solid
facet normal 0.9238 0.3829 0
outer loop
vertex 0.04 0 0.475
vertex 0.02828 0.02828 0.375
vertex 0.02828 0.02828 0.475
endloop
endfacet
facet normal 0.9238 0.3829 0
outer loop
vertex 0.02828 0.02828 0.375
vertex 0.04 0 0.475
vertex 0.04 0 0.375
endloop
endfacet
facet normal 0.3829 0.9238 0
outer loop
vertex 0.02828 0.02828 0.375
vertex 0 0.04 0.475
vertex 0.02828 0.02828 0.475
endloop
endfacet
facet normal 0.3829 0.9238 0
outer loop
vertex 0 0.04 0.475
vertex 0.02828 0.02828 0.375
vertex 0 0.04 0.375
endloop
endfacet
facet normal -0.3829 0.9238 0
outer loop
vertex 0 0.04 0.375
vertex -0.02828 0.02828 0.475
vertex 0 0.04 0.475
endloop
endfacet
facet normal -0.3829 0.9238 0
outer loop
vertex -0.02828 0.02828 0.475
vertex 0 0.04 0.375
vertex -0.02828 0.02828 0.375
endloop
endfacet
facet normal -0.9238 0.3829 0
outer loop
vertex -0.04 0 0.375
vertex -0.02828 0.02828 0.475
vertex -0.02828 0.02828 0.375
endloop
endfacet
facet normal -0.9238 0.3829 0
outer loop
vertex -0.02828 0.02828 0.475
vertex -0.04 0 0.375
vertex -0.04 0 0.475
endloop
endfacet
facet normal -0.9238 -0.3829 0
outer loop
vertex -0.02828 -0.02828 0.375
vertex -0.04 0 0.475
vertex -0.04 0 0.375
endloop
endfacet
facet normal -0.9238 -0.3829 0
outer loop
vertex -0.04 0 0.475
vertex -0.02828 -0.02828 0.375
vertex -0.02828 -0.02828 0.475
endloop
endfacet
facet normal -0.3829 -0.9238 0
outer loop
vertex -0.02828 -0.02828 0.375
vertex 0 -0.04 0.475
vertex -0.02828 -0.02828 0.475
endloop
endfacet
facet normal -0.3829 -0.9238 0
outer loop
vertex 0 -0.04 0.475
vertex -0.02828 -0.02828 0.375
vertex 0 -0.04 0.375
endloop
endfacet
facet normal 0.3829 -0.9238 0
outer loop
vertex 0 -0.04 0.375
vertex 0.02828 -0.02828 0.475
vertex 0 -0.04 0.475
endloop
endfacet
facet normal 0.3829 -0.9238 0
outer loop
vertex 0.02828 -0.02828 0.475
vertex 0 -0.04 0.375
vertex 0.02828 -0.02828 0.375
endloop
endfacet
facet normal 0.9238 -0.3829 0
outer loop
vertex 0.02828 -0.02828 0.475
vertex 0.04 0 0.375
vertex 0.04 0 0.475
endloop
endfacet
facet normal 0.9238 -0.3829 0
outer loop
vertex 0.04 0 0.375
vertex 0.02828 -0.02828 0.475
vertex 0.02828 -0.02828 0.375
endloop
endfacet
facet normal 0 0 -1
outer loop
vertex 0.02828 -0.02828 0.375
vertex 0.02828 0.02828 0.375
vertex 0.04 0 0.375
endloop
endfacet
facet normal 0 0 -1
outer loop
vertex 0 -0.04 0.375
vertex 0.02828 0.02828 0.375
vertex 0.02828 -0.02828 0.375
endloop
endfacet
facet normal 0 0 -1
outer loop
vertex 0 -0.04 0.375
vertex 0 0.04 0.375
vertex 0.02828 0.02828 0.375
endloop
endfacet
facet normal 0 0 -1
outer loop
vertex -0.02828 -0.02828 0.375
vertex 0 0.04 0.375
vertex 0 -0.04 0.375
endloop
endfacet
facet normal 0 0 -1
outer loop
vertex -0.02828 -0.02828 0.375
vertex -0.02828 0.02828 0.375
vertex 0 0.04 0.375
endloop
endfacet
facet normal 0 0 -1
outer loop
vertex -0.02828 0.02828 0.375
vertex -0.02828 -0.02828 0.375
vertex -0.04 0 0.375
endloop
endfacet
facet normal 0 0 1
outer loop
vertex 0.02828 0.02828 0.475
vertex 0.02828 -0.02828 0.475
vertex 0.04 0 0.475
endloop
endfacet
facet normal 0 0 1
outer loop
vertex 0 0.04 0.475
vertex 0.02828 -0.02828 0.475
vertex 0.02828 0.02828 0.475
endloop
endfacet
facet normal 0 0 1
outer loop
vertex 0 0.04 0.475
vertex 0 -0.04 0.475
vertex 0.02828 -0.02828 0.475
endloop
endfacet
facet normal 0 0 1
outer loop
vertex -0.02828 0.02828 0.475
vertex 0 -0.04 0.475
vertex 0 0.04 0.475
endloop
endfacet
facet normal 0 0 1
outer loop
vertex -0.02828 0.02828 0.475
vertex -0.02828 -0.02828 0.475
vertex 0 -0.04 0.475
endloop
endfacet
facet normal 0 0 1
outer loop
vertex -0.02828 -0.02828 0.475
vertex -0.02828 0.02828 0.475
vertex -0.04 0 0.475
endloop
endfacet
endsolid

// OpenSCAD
// file: lib.scad
function x(v) = v[0];
function y(v) = v[1];
function z(v) = v[2];
function add(v1,v2) = [ for (i = [ 0 : len(v1)-1 ]) v1[i] + v2[i] ];
function xv(d) = [d,0,0];
function yv(d) = [0,d,0];
function zv(d) = [0,0,d];

module box(v) { cube(size=v, center=true); }
module cyl(r1,r2,h) { cylinder(r1=r1, r2=r2, h=h, center=true); }

function grow(n,v) = [x(v)+n*2, y(v)+n*2, z(v)+n*2];

module rbox(v, radius=1) {
	cx = x(v)/2-radius;
	cy = y(v)/2-radius;
	cz = z(v)/2-radius;

	hull() {
		translate([cx,cy,cz]) sphere(r=radius);
		translate([cx,cy,-cz]) sphere(r=radius);
		translate([cx,-cy,cz]) sphere(r=radius);
		translate([cx,-cy,-cz]) sphere(r=radius);
		translate([-cx,cy,cz]) sphere(r=radius);
		translate([-cx,cy,-cz]) sphere(r=radius);
		translate([-cx,-cy,cz]) sphere(r=radius);
		translate([-cx,-cy,-cz]) sphere(r=radius);
	}
}

module fillet(r=1) {
  minkowski() {
    difference() {
      children();
      minkowski() {
        difference() {
          minkowski() {
            children();
            sphere(r=r);
          }
          children();
        }
        sphere(r=r);
      }
    }
    sphere(r=r);
  }
}
// main file
use <lib.scad>

module terminal() {
	translate([0,0,0.425]) cyl(0.04,0.04,0.1);
}

module cap() {
	translate([0,0,0.4]) box([0.31,0.51,0.075], 0.01);
}

module body() {
	translate([0,0,0.2]) box([0.3,0.5,0.4], 0.01);
}

d = 72;

//fillet(0.01, $fn=d/8) body($fn=d);
//body($fn=d);
//fillet(0.01, $fn=d/8) cap($fn=d);
//cap($fn=d);
terminal($fn=8);
